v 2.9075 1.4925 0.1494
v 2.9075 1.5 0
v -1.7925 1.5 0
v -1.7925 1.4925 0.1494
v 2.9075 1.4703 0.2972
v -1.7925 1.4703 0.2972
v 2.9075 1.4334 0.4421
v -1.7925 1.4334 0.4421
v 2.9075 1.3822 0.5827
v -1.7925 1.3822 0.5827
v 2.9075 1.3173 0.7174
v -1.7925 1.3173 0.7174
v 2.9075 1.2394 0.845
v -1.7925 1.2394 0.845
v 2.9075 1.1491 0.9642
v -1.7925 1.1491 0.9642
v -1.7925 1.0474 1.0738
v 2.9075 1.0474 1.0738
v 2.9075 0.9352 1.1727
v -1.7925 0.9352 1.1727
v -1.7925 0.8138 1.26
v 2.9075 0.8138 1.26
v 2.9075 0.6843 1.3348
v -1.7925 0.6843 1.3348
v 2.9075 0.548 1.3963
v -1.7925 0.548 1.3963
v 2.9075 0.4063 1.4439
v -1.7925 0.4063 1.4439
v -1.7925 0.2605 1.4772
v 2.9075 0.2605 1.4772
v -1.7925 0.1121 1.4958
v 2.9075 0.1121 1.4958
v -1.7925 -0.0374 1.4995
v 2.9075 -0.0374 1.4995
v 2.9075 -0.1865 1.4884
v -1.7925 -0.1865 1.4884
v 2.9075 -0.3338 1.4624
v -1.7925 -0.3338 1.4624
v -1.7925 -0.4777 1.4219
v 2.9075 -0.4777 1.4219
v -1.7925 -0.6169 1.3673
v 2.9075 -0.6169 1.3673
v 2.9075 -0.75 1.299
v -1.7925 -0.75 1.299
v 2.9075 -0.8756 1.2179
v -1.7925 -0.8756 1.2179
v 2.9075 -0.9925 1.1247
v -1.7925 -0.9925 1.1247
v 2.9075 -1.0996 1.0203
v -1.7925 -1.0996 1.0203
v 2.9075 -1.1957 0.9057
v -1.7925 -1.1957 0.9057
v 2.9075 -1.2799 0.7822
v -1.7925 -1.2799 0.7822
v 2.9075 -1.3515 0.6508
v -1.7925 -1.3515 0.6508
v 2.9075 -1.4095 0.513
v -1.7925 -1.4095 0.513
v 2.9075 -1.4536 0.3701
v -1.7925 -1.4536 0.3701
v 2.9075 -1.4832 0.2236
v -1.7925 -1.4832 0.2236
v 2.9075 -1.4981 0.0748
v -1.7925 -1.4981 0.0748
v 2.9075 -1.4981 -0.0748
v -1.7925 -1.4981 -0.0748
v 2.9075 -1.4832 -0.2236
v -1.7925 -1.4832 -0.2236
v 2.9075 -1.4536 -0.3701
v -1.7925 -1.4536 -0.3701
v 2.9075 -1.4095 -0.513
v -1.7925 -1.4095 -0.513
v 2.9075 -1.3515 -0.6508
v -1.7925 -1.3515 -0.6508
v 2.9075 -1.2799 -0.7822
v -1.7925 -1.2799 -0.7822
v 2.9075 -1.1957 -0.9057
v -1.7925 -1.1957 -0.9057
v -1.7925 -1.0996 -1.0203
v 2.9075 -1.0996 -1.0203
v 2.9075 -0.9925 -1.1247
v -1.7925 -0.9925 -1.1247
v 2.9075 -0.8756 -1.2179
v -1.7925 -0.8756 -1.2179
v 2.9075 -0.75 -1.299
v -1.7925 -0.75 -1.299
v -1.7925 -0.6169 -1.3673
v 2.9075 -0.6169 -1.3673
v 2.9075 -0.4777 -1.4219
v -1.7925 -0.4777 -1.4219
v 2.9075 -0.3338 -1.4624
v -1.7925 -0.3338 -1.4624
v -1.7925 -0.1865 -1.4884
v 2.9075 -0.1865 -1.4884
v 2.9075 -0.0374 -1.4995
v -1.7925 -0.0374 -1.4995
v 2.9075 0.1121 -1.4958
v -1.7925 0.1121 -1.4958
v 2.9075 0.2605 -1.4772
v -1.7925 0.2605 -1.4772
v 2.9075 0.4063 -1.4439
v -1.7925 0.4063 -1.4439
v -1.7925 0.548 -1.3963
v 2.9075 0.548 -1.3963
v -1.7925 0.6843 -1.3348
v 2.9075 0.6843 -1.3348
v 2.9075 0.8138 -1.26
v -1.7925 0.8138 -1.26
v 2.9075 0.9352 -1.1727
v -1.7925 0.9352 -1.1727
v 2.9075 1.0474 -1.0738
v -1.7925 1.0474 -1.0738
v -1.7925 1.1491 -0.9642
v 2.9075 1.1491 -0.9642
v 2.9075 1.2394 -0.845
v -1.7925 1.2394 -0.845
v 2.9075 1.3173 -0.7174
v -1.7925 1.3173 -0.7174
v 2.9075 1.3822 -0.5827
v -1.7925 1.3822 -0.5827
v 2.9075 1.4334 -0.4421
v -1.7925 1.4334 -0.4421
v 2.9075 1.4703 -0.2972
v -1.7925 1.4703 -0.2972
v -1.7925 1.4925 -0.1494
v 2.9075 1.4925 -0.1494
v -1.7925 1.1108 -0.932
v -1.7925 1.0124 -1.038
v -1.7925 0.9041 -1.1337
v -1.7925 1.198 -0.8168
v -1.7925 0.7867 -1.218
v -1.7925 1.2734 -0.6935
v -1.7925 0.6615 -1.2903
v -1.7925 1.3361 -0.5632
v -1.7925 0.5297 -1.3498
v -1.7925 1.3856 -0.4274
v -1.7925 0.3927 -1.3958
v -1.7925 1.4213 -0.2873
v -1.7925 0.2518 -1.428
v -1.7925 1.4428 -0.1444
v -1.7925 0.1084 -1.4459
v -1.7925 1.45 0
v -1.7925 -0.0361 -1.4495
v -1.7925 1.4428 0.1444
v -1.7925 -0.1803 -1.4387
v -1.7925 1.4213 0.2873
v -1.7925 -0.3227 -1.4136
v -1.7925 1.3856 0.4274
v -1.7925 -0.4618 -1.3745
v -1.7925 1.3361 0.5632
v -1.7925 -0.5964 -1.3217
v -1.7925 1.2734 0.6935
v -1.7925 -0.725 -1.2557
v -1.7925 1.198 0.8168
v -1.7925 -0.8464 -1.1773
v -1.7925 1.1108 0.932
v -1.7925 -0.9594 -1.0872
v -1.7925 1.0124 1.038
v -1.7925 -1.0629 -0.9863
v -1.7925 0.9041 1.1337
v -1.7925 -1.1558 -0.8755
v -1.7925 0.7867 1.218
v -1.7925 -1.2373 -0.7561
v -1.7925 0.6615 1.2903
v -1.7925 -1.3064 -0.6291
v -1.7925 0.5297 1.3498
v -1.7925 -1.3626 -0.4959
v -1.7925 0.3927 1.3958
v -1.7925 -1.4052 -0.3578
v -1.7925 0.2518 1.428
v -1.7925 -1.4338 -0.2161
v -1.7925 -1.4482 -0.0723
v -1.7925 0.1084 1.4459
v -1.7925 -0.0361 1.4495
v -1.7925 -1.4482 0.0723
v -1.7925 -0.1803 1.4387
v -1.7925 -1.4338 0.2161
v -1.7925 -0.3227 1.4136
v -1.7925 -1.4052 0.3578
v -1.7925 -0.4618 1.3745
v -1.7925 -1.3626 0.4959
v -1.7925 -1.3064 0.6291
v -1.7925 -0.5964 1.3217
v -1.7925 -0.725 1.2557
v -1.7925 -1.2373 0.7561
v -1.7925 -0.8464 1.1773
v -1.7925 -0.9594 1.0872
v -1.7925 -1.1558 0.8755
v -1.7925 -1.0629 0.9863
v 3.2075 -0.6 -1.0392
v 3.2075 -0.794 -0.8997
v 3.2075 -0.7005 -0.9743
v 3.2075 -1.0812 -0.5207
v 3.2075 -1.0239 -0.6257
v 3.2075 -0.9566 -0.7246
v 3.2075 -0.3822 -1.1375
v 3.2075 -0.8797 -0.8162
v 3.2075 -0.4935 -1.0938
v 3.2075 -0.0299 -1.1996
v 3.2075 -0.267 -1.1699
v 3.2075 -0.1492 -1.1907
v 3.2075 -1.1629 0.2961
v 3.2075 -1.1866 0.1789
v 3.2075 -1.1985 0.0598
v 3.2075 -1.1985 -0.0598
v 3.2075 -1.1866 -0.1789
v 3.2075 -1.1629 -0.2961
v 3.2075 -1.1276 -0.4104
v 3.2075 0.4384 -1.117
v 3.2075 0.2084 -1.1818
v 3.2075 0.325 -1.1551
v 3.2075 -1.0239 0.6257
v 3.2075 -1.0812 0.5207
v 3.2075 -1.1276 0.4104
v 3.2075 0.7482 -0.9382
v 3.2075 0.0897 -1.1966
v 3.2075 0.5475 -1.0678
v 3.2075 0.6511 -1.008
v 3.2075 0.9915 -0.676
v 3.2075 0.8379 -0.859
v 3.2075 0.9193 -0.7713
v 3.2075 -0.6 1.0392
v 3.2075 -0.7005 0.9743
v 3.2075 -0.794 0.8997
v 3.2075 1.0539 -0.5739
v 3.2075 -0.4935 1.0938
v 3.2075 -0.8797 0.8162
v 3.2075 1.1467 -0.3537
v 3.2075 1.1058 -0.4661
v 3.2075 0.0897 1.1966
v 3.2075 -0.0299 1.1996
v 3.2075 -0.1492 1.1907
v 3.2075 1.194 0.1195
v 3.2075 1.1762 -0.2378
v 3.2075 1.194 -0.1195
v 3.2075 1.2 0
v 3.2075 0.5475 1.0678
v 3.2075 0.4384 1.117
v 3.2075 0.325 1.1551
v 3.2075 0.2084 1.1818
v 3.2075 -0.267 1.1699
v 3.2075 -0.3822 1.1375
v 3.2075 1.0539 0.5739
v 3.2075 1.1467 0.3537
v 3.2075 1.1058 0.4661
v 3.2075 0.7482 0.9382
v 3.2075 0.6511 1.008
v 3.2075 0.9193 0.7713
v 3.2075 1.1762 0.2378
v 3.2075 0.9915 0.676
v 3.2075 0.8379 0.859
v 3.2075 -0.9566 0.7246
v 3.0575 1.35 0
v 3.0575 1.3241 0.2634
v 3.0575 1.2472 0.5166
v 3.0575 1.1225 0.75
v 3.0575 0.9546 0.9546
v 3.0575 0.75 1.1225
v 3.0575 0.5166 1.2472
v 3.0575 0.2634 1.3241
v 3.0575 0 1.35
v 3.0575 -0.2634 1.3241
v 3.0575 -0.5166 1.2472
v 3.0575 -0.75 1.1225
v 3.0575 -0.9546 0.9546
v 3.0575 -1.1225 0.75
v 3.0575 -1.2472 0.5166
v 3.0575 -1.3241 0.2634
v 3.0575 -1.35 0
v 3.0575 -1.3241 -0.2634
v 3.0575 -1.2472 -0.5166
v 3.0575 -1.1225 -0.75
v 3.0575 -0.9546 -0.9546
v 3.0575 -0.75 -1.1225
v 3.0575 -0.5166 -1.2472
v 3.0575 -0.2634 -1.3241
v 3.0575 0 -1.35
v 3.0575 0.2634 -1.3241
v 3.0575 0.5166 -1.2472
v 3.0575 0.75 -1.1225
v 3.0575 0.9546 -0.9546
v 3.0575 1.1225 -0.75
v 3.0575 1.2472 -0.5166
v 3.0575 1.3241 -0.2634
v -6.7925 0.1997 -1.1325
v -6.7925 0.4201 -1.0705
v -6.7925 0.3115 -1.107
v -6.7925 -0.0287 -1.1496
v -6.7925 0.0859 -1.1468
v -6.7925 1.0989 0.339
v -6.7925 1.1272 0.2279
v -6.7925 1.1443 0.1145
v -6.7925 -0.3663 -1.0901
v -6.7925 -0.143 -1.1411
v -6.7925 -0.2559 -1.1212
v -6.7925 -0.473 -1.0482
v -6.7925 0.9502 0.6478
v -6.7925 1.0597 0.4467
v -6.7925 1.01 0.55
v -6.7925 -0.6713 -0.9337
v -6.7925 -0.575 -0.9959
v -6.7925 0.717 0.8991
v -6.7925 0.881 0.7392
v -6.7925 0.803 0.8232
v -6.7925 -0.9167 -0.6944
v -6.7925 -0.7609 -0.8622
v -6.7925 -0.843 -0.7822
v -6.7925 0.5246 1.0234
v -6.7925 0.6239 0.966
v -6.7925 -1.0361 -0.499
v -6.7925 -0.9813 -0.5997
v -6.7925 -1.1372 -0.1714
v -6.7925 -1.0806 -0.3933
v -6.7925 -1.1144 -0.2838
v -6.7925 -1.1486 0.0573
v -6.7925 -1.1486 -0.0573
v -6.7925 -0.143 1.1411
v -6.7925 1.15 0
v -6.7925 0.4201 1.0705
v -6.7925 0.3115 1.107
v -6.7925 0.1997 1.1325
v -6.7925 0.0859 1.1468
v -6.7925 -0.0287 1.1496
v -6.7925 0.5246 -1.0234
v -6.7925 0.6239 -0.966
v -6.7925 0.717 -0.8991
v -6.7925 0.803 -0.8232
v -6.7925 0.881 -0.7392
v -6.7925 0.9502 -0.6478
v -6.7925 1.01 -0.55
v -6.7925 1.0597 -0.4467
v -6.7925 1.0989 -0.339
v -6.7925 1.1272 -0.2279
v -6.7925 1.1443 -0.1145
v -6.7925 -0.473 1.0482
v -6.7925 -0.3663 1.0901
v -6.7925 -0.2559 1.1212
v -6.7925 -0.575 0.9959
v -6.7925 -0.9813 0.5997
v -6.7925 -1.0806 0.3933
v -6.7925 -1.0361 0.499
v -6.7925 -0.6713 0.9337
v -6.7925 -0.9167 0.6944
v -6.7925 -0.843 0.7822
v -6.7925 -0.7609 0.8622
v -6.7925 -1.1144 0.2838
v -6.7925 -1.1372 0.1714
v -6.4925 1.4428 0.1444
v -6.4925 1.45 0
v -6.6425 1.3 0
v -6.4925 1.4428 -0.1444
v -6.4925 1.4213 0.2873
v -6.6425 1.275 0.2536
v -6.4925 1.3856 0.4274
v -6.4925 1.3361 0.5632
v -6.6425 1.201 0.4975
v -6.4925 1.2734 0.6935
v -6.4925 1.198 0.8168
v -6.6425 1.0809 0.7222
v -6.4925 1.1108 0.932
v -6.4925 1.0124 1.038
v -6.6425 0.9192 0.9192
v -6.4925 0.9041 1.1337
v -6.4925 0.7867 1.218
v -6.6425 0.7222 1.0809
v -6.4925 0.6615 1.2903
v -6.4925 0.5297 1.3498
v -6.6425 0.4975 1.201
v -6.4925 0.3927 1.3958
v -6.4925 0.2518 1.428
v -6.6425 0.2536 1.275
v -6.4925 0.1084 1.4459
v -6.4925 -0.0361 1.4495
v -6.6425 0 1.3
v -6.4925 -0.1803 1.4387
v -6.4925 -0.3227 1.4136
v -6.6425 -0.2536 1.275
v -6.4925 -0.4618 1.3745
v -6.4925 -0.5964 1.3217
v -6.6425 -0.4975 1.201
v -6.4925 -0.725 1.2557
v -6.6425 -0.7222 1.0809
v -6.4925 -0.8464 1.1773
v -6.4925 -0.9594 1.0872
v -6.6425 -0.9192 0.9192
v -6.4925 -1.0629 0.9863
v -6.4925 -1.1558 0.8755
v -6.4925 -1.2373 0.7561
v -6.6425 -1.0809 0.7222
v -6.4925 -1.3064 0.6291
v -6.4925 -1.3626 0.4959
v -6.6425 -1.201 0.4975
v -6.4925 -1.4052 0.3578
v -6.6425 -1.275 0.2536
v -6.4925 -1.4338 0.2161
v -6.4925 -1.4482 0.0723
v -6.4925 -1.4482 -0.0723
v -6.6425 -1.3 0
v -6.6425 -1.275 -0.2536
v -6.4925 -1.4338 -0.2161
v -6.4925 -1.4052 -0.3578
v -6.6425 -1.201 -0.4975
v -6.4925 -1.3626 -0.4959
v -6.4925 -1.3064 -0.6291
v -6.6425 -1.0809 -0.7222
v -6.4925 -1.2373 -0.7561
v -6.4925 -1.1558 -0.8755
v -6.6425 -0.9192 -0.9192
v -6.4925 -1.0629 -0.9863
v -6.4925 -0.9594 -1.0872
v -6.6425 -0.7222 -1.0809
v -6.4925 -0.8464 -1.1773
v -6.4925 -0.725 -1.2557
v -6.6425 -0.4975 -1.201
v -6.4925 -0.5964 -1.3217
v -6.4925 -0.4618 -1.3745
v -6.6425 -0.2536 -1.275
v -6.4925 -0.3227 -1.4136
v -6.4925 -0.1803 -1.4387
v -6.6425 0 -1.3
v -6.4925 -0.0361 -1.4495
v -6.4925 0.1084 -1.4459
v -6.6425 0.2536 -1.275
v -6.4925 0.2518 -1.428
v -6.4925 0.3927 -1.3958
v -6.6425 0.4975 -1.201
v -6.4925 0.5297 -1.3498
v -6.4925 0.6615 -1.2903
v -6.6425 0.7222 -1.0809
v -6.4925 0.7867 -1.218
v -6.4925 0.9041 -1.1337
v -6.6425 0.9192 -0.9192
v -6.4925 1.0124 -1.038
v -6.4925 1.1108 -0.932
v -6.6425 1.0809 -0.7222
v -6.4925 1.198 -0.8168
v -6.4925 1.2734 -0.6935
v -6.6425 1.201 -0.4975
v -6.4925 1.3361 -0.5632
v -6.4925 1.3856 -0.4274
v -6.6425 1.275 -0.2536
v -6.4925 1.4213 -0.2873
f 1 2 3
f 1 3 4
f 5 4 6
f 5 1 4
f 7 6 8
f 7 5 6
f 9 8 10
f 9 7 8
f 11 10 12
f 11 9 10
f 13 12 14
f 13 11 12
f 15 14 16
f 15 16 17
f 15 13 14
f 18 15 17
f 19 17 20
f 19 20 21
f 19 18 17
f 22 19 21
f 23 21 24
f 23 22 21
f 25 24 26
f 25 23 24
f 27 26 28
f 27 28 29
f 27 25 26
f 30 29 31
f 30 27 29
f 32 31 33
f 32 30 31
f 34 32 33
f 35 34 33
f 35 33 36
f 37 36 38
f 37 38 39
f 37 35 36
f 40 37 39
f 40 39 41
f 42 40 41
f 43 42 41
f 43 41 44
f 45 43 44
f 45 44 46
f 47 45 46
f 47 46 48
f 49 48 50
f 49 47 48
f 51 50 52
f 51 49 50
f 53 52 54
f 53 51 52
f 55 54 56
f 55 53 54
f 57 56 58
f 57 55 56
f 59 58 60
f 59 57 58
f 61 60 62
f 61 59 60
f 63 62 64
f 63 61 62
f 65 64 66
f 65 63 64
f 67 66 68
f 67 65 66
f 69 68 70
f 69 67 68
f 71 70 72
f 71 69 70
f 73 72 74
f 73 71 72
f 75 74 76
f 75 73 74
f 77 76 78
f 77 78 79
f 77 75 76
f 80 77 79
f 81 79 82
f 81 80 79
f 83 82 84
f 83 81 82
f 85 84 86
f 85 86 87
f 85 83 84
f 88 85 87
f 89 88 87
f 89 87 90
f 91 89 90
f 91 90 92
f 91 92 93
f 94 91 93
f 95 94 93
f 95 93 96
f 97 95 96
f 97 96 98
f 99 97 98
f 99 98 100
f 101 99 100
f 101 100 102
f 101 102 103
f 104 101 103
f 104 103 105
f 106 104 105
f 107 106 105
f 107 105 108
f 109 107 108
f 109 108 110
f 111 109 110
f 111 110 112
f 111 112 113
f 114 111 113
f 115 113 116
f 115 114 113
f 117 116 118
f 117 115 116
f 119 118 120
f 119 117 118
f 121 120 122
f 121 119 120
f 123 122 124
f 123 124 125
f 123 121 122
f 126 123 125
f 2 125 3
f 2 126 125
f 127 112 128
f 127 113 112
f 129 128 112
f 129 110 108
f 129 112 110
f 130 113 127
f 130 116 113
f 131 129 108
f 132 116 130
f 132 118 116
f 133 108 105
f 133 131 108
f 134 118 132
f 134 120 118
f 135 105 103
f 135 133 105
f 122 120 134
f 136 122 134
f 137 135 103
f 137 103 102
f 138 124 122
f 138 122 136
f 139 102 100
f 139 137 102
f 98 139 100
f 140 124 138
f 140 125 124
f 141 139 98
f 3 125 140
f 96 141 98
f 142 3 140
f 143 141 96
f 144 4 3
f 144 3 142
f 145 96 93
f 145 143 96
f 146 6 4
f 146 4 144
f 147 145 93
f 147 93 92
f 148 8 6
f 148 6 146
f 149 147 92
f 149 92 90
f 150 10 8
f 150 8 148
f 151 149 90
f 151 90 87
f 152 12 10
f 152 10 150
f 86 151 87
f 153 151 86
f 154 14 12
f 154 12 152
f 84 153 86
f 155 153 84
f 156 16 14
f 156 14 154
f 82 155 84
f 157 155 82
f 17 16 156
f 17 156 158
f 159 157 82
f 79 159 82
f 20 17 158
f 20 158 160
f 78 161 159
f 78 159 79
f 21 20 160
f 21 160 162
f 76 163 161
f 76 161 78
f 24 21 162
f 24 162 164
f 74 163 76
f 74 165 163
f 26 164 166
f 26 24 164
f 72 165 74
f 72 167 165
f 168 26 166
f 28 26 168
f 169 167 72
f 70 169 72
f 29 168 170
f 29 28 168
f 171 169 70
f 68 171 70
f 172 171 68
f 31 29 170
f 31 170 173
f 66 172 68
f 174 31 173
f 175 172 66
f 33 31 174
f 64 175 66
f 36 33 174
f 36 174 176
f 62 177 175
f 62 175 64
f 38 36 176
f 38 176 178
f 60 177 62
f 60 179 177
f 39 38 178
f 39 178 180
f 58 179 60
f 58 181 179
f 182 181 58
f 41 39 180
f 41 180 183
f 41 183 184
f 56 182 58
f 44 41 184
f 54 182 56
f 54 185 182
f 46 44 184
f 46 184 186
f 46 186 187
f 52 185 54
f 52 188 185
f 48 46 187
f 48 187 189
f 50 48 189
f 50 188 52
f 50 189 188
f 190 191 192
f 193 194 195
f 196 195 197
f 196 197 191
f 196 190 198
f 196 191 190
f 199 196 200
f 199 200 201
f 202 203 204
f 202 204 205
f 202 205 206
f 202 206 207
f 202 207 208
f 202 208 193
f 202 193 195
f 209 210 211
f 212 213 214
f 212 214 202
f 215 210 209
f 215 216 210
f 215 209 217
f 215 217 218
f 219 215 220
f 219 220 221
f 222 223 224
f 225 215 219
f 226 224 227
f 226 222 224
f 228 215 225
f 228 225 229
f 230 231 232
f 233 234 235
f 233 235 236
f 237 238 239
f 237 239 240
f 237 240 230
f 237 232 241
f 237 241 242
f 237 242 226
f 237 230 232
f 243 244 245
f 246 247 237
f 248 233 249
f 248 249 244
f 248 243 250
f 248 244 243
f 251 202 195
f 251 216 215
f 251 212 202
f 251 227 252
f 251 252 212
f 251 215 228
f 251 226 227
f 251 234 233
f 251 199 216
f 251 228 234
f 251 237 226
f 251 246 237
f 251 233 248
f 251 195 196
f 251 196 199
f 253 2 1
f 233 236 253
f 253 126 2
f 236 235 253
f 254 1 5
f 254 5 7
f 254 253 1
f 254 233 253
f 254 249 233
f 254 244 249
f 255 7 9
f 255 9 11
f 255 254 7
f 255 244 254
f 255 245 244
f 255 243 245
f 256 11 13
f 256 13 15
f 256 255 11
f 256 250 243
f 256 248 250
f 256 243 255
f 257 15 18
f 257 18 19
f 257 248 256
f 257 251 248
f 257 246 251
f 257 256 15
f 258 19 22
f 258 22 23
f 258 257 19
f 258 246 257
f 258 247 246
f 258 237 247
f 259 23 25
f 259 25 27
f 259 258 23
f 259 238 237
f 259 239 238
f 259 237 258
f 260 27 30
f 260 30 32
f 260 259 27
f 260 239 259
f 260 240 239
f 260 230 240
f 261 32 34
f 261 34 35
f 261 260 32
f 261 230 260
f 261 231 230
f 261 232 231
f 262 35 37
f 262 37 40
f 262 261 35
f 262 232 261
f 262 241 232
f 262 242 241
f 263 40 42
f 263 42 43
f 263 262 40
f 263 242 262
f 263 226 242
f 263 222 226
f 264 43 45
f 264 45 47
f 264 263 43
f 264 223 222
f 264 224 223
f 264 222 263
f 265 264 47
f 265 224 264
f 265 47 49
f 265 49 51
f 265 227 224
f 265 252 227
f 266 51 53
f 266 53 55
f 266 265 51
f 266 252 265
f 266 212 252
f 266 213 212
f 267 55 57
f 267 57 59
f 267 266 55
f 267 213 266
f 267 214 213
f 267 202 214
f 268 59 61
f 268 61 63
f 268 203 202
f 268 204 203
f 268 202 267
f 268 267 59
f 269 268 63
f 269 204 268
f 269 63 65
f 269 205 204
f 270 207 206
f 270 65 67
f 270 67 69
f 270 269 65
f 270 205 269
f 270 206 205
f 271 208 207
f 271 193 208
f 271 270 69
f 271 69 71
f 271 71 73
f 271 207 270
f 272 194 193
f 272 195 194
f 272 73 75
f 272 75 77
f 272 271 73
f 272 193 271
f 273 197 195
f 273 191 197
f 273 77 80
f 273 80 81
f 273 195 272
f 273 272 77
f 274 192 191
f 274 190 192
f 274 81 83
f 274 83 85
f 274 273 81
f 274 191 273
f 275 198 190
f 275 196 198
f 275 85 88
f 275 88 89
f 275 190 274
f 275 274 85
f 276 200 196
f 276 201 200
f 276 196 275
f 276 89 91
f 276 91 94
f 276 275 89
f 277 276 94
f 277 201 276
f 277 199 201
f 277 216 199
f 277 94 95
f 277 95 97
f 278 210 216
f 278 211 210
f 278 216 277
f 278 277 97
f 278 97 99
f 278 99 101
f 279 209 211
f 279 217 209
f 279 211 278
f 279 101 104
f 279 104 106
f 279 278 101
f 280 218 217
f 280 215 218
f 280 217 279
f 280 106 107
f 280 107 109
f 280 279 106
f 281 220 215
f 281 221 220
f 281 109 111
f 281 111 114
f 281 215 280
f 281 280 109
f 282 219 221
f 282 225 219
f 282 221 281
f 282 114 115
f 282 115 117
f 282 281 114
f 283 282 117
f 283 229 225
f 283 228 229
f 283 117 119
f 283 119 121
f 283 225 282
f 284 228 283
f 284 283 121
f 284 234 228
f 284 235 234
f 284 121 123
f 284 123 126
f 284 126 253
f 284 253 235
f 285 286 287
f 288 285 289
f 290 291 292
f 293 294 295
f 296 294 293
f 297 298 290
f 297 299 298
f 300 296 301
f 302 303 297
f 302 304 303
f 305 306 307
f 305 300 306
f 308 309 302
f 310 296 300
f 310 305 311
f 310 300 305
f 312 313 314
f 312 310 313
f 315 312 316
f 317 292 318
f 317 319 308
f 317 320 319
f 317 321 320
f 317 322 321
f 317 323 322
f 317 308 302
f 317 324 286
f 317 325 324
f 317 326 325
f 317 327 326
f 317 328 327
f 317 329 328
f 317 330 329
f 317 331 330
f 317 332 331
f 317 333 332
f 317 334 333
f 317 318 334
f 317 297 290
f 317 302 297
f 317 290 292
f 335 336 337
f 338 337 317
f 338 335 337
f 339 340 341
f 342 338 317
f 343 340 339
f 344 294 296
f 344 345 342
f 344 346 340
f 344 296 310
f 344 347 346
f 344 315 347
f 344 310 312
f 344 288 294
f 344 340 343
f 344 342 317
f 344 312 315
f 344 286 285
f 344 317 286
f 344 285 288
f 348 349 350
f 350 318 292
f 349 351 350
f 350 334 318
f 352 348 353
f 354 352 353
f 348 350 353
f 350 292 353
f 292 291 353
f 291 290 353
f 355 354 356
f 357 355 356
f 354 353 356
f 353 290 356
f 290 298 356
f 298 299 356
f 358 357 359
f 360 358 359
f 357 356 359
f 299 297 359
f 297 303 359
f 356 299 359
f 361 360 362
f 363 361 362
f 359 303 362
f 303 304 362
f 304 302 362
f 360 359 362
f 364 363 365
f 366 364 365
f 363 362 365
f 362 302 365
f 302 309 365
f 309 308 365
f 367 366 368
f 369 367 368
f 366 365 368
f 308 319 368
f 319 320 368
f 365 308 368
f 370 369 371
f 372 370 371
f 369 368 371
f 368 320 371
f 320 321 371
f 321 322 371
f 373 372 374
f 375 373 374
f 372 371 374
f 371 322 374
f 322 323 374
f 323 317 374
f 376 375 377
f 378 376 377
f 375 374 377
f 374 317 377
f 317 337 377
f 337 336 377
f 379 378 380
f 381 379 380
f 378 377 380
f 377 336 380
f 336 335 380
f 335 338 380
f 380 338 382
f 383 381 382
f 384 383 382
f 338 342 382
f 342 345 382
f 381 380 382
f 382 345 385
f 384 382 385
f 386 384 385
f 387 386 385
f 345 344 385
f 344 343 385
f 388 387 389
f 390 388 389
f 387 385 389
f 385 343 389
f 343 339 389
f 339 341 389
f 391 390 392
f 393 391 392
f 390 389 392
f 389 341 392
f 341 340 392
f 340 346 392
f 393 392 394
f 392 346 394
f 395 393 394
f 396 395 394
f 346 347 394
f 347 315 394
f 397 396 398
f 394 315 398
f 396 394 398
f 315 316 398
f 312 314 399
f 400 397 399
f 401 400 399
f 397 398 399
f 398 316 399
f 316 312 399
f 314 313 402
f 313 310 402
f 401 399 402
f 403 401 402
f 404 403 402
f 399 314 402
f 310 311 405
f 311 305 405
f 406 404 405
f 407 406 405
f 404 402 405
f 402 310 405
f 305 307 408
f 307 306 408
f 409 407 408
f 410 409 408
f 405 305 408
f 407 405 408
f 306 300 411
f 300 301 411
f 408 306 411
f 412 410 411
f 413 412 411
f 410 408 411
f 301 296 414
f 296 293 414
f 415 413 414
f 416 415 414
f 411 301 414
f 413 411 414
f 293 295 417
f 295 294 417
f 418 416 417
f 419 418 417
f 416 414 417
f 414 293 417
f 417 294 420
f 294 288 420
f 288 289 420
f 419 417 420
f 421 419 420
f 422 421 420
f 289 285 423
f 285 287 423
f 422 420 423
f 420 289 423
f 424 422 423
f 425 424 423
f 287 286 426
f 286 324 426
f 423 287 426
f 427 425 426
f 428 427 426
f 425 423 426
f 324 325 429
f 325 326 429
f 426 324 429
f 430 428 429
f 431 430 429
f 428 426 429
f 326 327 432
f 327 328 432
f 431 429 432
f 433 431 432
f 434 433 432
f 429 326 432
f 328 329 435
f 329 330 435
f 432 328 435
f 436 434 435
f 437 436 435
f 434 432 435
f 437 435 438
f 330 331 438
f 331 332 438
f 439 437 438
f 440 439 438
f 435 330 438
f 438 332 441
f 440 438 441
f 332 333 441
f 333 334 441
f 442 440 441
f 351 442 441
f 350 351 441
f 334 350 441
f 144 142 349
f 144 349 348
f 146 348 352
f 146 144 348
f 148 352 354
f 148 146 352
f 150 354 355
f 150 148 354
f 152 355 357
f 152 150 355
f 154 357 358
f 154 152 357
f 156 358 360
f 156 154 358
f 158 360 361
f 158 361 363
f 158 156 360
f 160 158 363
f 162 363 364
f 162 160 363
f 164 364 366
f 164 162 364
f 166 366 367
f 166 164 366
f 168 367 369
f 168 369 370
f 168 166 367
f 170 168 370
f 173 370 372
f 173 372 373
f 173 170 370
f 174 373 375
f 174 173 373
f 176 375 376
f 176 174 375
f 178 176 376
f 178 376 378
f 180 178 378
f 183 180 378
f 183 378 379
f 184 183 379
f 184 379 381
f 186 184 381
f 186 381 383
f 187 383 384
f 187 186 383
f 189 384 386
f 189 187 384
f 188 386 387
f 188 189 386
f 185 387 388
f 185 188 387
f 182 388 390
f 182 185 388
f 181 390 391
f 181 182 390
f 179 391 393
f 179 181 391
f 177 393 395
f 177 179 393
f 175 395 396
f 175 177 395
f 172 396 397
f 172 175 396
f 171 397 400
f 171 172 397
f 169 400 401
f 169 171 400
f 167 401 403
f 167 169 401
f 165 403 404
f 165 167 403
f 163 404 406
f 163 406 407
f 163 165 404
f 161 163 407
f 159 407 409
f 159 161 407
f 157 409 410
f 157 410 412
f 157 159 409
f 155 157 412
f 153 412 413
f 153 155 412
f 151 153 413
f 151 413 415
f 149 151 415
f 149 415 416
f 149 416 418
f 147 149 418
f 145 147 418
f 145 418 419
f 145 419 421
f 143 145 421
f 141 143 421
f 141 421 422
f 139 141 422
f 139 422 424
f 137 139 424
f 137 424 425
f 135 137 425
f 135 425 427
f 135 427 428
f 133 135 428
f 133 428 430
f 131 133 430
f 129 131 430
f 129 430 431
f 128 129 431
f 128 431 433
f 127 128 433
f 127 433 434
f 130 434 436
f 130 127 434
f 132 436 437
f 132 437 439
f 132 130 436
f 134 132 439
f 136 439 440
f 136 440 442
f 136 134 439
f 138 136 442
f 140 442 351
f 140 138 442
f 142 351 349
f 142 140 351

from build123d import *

# Parameters (mm, degrees)
CHAMFER1_SIZE = 0.3


with BuildPart() as part:
    # Sketch1 → Revolve1 (revolve)
    with BuildSketch(Plane.XY):
        Polygon((-6.79253012, 1.45), (-1.79253012, 1.45), (-1.79253012, 1.5), (3.20746988, 1.5), (3.20746988, 0), (-6.79253012, 0), align=None)
    revolve(axis=Axis((-2.508674699, 0, 0), (1, 0, 0)))

    # Chamfer1
    chamfer1_edges = [part.edges().sort_by_distance(p)[0] for p in [
        (3.20746988, -1.5, 0),
        (-6.79253012, -1.45, 0),
    ]]
    chamfer(chamfer1_edges, length=CHAMFER1_SIZE)


solid = part.part
